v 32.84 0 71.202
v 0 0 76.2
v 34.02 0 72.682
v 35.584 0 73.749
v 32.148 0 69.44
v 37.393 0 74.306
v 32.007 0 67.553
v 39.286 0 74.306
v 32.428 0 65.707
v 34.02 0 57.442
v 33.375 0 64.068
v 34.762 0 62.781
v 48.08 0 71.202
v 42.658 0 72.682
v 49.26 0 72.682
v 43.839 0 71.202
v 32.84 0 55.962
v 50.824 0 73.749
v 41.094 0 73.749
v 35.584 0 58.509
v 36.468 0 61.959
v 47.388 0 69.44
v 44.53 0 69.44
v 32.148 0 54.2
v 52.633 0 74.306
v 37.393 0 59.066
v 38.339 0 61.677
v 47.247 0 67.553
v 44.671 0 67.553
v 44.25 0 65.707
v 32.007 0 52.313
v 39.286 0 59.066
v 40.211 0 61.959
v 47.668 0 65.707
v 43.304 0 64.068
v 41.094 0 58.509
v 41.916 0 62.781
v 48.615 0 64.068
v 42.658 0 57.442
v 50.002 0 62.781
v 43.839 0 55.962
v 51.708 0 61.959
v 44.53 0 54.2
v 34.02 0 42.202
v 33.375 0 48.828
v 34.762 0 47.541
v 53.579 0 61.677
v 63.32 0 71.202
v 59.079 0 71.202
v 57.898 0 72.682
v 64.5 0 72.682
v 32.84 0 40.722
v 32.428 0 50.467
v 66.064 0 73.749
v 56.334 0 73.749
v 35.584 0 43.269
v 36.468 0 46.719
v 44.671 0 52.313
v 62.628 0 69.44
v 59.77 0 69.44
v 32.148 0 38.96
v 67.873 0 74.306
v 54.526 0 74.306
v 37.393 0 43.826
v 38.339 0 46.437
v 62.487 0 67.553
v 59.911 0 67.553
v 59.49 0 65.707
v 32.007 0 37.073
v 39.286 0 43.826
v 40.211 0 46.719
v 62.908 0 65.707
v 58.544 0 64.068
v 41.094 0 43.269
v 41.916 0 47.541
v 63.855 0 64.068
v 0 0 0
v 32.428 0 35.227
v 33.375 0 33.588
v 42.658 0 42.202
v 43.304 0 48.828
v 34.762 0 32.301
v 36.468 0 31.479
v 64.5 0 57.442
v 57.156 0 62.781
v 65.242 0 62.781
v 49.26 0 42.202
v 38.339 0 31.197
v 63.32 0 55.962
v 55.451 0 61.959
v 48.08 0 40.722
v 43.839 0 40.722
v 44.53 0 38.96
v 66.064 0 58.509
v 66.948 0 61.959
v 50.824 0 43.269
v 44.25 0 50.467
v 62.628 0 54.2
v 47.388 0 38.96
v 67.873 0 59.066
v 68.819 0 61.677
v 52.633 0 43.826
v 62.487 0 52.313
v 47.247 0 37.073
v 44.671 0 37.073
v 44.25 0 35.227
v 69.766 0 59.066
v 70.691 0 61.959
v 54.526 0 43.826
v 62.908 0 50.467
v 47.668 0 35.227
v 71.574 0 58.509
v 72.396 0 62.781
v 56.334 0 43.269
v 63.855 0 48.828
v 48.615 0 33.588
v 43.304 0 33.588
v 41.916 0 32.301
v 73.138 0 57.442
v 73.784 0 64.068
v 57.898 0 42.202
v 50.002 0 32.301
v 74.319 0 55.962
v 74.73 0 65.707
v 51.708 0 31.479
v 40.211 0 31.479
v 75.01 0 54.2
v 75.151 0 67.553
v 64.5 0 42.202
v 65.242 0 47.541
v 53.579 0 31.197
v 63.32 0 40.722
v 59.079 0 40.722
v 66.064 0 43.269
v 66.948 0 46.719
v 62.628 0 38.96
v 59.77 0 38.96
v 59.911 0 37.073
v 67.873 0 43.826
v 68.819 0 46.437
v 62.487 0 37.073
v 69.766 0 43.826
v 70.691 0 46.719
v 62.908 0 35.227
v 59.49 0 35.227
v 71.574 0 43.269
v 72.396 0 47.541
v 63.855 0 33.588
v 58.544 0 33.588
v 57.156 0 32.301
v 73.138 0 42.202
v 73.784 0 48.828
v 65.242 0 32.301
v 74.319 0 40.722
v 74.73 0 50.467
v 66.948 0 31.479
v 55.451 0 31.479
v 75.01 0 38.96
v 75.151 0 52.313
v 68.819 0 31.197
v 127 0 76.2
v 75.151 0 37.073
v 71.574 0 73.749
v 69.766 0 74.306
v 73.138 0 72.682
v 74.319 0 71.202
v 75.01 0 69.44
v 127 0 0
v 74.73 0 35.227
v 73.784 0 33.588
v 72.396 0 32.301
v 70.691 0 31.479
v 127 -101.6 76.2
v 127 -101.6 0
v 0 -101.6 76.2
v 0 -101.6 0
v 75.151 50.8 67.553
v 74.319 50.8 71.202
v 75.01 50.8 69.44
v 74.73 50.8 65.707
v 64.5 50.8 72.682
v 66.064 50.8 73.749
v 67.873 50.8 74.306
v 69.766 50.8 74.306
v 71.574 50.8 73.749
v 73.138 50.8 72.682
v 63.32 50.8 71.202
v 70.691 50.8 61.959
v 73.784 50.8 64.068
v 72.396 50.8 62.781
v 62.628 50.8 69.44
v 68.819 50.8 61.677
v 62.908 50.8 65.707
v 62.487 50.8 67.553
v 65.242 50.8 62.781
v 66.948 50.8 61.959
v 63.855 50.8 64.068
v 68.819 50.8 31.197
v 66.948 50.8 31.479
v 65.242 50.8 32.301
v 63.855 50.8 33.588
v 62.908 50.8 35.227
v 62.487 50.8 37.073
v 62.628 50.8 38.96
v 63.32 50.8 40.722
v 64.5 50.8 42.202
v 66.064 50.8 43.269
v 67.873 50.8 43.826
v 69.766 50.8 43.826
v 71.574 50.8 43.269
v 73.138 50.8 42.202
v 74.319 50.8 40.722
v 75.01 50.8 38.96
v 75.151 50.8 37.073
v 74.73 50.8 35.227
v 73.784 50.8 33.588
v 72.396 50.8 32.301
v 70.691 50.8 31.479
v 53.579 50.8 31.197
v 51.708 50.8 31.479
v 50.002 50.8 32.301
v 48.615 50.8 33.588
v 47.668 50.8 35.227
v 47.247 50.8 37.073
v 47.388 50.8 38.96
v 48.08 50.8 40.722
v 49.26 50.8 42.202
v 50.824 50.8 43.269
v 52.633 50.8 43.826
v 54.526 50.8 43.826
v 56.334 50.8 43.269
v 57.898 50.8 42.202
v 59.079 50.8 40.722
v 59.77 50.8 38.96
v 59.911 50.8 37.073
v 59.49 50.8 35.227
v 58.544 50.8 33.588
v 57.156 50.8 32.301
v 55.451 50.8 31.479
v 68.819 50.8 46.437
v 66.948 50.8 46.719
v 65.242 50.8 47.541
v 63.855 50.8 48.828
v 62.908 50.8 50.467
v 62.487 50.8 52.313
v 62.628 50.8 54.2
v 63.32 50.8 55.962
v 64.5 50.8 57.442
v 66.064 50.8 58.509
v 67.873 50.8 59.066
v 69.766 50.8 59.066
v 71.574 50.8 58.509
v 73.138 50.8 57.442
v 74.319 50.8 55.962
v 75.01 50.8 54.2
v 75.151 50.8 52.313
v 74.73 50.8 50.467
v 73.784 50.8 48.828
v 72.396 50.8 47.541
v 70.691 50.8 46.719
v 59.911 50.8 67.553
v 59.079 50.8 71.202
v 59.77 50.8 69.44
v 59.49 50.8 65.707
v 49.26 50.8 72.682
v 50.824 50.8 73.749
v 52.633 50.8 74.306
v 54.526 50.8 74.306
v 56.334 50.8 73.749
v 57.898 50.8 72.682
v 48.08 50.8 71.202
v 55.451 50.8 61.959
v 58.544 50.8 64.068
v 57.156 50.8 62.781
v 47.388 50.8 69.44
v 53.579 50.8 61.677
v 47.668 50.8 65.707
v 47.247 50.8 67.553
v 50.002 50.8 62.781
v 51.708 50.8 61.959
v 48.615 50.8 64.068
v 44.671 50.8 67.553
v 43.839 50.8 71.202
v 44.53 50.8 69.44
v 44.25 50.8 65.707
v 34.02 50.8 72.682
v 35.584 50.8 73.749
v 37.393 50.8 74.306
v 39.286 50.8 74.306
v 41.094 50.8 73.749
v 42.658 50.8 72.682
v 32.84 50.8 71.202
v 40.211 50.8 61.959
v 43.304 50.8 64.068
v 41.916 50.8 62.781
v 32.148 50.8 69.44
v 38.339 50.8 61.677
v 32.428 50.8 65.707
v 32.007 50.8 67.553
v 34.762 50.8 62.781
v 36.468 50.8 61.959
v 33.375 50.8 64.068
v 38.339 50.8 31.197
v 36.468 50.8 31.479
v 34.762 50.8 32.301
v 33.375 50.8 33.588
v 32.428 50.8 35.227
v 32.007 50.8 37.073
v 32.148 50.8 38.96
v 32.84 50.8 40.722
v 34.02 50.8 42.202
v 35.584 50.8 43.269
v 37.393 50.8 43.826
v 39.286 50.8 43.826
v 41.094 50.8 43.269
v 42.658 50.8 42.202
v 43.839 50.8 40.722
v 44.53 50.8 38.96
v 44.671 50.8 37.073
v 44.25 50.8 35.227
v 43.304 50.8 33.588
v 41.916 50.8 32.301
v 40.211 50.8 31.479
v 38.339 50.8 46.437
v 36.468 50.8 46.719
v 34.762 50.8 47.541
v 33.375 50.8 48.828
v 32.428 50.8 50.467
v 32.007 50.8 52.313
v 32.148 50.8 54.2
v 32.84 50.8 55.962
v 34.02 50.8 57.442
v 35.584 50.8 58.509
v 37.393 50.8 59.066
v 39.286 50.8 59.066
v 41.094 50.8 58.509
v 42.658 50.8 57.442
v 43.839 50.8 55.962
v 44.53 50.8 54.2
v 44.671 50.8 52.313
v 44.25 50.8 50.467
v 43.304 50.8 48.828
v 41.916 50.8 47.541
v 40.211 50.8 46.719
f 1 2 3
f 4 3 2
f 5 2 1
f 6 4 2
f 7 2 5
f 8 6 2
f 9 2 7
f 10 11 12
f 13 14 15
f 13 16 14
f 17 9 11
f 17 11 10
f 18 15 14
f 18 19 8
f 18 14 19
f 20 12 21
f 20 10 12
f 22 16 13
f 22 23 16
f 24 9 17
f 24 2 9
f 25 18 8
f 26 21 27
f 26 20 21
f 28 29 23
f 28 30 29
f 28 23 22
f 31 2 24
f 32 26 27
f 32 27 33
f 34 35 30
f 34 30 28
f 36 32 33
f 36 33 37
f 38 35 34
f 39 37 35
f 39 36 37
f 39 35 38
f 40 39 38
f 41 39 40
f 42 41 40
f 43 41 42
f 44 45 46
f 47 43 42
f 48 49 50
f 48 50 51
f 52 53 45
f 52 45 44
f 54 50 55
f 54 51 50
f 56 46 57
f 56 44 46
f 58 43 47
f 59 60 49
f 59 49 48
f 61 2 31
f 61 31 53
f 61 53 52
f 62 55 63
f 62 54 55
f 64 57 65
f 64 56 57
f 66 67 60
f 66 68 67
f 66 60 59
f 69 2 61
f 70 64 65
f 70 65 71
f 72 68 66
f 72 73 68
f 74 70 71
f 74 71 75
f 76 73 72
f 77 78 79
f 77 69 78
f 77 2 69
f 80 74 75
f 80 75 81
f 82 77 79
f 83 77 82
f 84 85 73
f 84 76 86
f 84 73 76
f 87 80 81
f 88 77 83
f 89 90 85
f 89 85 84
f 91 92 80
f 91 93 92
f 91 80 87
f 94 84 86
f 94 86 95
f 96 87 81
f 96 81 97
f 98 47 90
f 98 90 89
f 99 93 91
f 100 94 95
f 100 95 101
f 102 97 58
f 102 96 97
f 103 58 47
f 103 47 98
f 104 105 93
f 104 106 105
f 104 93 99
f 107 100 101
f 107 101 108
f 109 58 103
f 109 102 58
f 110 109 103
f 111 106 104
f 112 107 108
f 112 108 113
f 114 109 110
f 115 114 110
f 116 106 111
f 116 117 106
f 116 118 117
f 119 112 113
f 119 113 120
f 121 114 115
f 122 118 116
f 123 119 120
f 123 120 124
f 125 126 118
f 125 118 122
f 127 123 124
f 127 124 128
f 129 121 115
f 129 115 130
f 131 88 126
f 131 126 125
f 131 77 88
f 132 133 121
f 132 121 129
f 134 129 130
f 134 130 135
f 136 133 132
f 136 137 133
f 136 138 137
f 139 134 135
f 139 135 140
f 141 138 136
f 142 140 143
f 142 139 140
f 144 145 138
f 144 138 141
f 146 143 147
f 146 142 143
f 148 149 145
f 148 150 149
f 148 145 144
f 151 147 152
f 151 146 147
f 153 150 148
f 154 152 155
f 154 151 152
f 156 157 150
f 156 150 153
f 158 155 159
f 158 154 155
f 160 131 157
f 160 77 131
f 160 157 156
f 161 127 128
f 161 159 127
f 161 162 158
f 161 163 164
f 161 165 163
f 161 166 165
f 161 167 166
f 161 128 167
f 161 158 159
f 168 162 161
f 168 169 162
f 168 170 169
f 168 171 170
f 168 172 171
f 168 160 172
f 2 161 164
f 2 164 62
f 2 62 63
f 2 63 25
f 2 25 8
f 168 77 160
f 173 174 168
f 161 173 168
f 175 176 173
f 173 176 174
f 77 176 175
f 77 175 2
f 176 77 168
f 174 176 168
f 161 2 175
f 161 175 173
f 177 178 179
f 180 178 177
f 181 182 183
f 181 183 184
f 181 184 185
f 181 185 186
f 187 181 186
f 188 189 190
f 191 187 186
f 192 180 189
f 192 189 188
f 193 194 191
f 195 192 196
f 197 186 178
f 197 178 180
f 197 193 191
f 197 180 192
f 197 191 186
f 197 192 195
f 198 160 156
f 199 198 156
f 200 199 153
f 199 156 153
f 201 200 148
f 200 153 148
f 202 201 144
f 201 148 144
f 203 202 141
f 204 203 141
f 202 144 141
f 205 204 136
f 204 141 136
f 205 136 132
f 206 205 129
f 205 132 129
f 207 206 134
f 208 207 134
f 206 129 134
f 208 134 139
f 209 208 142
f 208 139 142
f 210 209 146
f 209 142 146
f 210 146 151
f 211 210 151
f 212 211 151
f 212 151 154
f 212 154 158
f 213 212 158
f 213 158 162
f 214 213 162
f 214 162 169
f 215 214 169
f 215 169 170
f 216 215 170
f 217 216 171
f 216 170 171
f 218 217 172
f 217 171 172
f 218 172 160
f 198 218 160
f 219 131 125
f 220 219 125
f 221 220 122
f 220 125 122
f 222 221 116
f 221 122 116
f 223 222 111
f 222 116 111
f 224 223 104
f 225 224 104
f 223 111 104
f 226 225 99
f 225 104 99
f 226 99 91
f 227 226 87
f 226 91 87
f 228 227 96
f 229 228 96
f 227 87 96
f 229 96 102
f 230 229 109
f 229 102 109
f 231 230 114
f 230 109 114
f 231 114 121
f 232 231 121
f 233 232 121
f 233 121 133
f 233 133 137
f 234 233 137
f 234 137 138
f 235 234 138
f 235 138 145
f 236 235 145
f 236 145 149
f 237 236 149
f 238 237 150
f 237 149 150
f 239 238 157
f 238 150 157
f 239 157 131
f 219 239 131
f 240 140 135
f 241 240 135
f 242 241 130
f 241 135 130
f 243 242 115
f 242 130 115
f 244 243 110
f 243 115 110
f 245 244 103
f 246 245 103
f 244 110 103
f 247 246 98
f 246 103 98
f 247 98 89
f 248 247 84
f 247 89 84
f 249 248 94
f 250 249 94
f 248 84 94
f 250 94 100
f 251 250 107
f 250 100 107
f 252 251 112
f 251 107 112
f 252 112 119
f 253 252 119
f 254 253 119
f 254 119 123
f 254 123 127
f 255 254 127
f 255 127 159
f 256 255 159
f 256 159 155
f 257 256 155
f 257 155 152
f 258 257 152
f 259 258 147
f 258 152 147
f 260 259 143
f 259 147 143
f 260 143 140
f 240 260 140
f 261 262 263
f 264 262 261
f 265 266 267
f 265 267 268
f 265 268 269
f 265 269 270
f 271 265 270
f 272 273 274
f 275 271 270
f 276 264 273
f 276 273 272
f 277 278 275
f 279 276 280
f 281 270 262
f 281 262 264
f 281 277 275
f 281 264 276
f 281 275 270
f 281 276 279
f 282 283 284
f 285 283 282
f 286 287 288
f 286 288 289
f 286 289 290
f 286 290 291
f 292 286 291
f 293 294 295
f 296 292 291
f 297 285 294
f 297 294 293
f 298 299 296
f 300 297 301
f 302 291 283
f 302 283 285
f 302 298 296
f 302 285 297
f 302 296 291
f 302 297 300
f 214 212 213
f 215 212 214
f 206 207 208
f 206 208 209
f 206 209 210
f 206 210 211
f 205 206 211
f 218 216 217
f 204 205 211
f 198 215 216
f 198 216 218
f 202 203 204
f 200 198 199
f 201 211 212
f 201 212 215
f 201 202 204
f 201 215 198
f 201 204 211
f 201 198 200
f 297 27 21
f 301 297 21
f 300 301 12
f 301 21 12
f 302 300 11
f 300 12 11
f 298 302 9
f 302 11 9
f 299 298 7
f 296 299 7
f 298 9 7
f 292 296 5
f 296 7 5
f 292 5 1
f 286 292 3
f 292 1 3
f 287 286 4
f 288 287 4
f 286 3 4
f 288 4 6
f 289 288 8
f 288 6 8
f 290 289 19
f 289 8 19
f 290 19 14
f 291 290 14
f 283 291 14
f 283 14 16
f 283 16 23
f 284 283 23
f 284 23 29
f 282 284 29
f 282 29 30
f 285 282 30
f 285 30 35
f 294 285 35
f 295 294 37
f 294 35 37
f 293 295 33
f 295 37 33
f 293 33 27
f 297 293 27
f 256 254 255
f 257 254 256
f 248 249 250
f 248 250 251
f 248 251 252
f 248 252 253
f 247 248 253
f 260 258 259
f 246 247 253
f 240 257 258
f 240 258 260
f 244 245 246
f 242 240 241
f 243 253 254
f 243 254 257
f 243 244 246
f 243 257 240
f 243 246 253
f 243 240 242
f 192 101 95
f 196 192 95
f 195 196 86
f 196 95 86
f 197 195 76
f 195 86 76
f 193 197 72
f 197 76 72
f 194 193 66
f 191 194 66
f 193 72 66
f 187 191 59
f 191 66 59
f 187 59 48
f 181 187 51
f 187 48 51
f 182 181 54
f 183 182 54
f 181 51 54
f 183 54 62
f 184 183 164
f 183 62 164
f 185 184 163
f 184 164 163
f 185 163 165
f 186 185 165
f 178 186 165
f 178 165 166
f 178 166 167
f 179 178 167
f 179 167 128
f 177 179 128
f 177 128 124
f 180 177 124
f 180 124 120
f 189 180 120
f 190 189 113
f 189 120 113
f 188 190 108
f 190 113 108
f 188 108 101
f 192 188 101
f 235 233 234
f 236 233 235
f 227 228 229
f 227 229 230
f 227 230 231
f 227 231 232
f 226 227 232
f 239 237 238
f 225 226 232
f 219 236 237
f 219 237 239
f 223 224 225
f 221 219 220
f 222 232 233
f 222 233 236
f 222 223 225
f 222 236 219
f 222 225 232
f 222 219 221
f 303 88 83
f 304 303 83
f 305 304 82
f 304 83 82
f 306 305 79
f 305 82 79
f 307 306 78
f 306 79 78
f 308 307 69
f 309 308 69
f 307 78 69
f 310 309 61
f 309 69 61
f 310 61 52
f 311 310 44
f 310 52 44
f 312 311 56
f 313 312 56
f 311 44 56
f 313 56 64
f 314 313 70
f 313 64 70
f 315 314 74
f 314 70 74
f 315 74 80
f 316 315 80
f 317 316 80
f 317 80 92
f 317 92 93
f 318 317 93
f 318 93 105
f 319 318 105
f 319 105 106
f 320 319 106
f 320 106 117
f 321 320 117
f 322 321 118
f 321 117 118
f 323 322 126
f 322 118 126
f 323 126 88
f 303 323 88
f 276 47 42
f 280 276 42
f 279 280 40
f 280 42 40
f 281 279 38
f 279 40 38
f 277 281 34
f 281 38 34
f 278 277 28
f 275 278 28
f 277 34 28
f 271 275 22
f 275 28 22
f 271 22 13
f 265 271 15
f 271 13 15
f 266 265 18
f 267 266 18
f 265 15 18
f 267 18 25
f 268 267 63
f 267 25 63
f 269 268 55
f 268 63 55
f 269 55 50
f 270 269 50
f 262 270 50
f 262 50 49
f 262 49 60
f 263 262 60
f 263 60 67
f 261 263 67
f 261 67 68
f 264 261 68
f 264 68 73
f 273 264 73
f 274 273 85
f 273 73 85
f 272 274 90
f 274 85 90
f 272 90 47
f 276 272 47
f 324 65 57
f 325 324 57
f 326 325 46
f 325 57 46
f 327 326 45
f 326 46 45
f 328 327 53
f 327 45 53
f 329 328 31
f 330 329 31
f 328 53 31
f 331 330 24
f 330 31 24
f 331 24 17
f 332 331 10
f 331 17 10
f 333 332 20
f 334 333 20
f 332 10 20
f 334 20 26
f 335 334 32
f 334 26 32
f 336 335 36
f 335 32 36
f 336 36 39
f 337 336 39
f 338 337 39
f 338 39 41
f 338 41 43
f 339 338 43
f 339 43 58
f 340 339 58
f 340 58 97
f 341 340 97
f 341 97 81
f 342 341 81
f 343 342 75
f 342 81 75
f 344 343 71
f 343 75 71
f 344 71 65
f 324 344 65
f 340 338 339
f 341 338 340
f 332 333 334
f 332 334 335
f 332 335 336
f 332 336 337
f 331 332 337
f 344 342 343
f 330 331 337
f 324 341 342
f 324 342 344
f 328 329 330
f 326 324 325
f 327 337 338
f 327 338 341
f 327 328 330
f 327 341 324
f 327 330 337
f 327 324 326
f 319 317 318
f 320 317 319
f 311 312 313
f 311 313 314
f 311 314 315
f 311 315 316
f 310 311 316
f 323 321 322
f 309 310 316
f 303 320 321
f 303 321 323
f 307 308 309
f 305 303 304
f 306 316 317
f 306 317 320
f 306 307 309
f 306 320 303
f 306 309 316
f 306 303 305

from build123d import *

# Parameters (mm, degrees)
SKETCH1_W            = 127
SKETCH1_H            = 101.6
BOSS_EXTRUDE1_DEPTH  = 76.2
SKETCH2_R            = 6.35
BOSS_EXTRUDE3_DEPTH  = 50.8
LPATTERN2_COUNT      = 3
LPATTERN2_PITCH      = 15.24
LPATTERN2_COUNT_DIR2 = 3
LPATTERN2_PITCH_DIR2 = 15.24


with BuildPart() as part:
    # Sketch1 → Boss-Extrude1 (new body)
    with BuildSketch(Plane.XY):
        with Locations((63.5, -50.8)):
            Rectangle(SKETCH1_W, SKETCH1_H)
    extrude(amount=BOSS_EXTRUDE1_DEPTH)

    # Sketch2 → Boss-Extrude3 (add)
    with BuildSketch(Plane(origin=(0, 0, 0), x_dir=(1, 0, 0), z_dir=(0, 1, 0))):
        with Locations(Location((68.819241674, -37.547351514, 0), (0, 0, 90))):
            Circle(SKETCH2_R)
    boss_extrude3 = extrude(amount=BOSS_EXTRUDE3_DEPTH)

    # LPattern2: Boss-Extrude3 3 × 3, 1 skipped
    with Locations(*[(-i * LPATTERN2_PITCH, 0, j * LPATTERN2_PITCH_DIR2) for i in range(LPATTERN2_COUNT) for j in range(LPATTERN2_COUNT_DIR2) if (i, j) not in ((0, 0), (1, 1))]):
        add(boss_extrude3)


solid = part.part
